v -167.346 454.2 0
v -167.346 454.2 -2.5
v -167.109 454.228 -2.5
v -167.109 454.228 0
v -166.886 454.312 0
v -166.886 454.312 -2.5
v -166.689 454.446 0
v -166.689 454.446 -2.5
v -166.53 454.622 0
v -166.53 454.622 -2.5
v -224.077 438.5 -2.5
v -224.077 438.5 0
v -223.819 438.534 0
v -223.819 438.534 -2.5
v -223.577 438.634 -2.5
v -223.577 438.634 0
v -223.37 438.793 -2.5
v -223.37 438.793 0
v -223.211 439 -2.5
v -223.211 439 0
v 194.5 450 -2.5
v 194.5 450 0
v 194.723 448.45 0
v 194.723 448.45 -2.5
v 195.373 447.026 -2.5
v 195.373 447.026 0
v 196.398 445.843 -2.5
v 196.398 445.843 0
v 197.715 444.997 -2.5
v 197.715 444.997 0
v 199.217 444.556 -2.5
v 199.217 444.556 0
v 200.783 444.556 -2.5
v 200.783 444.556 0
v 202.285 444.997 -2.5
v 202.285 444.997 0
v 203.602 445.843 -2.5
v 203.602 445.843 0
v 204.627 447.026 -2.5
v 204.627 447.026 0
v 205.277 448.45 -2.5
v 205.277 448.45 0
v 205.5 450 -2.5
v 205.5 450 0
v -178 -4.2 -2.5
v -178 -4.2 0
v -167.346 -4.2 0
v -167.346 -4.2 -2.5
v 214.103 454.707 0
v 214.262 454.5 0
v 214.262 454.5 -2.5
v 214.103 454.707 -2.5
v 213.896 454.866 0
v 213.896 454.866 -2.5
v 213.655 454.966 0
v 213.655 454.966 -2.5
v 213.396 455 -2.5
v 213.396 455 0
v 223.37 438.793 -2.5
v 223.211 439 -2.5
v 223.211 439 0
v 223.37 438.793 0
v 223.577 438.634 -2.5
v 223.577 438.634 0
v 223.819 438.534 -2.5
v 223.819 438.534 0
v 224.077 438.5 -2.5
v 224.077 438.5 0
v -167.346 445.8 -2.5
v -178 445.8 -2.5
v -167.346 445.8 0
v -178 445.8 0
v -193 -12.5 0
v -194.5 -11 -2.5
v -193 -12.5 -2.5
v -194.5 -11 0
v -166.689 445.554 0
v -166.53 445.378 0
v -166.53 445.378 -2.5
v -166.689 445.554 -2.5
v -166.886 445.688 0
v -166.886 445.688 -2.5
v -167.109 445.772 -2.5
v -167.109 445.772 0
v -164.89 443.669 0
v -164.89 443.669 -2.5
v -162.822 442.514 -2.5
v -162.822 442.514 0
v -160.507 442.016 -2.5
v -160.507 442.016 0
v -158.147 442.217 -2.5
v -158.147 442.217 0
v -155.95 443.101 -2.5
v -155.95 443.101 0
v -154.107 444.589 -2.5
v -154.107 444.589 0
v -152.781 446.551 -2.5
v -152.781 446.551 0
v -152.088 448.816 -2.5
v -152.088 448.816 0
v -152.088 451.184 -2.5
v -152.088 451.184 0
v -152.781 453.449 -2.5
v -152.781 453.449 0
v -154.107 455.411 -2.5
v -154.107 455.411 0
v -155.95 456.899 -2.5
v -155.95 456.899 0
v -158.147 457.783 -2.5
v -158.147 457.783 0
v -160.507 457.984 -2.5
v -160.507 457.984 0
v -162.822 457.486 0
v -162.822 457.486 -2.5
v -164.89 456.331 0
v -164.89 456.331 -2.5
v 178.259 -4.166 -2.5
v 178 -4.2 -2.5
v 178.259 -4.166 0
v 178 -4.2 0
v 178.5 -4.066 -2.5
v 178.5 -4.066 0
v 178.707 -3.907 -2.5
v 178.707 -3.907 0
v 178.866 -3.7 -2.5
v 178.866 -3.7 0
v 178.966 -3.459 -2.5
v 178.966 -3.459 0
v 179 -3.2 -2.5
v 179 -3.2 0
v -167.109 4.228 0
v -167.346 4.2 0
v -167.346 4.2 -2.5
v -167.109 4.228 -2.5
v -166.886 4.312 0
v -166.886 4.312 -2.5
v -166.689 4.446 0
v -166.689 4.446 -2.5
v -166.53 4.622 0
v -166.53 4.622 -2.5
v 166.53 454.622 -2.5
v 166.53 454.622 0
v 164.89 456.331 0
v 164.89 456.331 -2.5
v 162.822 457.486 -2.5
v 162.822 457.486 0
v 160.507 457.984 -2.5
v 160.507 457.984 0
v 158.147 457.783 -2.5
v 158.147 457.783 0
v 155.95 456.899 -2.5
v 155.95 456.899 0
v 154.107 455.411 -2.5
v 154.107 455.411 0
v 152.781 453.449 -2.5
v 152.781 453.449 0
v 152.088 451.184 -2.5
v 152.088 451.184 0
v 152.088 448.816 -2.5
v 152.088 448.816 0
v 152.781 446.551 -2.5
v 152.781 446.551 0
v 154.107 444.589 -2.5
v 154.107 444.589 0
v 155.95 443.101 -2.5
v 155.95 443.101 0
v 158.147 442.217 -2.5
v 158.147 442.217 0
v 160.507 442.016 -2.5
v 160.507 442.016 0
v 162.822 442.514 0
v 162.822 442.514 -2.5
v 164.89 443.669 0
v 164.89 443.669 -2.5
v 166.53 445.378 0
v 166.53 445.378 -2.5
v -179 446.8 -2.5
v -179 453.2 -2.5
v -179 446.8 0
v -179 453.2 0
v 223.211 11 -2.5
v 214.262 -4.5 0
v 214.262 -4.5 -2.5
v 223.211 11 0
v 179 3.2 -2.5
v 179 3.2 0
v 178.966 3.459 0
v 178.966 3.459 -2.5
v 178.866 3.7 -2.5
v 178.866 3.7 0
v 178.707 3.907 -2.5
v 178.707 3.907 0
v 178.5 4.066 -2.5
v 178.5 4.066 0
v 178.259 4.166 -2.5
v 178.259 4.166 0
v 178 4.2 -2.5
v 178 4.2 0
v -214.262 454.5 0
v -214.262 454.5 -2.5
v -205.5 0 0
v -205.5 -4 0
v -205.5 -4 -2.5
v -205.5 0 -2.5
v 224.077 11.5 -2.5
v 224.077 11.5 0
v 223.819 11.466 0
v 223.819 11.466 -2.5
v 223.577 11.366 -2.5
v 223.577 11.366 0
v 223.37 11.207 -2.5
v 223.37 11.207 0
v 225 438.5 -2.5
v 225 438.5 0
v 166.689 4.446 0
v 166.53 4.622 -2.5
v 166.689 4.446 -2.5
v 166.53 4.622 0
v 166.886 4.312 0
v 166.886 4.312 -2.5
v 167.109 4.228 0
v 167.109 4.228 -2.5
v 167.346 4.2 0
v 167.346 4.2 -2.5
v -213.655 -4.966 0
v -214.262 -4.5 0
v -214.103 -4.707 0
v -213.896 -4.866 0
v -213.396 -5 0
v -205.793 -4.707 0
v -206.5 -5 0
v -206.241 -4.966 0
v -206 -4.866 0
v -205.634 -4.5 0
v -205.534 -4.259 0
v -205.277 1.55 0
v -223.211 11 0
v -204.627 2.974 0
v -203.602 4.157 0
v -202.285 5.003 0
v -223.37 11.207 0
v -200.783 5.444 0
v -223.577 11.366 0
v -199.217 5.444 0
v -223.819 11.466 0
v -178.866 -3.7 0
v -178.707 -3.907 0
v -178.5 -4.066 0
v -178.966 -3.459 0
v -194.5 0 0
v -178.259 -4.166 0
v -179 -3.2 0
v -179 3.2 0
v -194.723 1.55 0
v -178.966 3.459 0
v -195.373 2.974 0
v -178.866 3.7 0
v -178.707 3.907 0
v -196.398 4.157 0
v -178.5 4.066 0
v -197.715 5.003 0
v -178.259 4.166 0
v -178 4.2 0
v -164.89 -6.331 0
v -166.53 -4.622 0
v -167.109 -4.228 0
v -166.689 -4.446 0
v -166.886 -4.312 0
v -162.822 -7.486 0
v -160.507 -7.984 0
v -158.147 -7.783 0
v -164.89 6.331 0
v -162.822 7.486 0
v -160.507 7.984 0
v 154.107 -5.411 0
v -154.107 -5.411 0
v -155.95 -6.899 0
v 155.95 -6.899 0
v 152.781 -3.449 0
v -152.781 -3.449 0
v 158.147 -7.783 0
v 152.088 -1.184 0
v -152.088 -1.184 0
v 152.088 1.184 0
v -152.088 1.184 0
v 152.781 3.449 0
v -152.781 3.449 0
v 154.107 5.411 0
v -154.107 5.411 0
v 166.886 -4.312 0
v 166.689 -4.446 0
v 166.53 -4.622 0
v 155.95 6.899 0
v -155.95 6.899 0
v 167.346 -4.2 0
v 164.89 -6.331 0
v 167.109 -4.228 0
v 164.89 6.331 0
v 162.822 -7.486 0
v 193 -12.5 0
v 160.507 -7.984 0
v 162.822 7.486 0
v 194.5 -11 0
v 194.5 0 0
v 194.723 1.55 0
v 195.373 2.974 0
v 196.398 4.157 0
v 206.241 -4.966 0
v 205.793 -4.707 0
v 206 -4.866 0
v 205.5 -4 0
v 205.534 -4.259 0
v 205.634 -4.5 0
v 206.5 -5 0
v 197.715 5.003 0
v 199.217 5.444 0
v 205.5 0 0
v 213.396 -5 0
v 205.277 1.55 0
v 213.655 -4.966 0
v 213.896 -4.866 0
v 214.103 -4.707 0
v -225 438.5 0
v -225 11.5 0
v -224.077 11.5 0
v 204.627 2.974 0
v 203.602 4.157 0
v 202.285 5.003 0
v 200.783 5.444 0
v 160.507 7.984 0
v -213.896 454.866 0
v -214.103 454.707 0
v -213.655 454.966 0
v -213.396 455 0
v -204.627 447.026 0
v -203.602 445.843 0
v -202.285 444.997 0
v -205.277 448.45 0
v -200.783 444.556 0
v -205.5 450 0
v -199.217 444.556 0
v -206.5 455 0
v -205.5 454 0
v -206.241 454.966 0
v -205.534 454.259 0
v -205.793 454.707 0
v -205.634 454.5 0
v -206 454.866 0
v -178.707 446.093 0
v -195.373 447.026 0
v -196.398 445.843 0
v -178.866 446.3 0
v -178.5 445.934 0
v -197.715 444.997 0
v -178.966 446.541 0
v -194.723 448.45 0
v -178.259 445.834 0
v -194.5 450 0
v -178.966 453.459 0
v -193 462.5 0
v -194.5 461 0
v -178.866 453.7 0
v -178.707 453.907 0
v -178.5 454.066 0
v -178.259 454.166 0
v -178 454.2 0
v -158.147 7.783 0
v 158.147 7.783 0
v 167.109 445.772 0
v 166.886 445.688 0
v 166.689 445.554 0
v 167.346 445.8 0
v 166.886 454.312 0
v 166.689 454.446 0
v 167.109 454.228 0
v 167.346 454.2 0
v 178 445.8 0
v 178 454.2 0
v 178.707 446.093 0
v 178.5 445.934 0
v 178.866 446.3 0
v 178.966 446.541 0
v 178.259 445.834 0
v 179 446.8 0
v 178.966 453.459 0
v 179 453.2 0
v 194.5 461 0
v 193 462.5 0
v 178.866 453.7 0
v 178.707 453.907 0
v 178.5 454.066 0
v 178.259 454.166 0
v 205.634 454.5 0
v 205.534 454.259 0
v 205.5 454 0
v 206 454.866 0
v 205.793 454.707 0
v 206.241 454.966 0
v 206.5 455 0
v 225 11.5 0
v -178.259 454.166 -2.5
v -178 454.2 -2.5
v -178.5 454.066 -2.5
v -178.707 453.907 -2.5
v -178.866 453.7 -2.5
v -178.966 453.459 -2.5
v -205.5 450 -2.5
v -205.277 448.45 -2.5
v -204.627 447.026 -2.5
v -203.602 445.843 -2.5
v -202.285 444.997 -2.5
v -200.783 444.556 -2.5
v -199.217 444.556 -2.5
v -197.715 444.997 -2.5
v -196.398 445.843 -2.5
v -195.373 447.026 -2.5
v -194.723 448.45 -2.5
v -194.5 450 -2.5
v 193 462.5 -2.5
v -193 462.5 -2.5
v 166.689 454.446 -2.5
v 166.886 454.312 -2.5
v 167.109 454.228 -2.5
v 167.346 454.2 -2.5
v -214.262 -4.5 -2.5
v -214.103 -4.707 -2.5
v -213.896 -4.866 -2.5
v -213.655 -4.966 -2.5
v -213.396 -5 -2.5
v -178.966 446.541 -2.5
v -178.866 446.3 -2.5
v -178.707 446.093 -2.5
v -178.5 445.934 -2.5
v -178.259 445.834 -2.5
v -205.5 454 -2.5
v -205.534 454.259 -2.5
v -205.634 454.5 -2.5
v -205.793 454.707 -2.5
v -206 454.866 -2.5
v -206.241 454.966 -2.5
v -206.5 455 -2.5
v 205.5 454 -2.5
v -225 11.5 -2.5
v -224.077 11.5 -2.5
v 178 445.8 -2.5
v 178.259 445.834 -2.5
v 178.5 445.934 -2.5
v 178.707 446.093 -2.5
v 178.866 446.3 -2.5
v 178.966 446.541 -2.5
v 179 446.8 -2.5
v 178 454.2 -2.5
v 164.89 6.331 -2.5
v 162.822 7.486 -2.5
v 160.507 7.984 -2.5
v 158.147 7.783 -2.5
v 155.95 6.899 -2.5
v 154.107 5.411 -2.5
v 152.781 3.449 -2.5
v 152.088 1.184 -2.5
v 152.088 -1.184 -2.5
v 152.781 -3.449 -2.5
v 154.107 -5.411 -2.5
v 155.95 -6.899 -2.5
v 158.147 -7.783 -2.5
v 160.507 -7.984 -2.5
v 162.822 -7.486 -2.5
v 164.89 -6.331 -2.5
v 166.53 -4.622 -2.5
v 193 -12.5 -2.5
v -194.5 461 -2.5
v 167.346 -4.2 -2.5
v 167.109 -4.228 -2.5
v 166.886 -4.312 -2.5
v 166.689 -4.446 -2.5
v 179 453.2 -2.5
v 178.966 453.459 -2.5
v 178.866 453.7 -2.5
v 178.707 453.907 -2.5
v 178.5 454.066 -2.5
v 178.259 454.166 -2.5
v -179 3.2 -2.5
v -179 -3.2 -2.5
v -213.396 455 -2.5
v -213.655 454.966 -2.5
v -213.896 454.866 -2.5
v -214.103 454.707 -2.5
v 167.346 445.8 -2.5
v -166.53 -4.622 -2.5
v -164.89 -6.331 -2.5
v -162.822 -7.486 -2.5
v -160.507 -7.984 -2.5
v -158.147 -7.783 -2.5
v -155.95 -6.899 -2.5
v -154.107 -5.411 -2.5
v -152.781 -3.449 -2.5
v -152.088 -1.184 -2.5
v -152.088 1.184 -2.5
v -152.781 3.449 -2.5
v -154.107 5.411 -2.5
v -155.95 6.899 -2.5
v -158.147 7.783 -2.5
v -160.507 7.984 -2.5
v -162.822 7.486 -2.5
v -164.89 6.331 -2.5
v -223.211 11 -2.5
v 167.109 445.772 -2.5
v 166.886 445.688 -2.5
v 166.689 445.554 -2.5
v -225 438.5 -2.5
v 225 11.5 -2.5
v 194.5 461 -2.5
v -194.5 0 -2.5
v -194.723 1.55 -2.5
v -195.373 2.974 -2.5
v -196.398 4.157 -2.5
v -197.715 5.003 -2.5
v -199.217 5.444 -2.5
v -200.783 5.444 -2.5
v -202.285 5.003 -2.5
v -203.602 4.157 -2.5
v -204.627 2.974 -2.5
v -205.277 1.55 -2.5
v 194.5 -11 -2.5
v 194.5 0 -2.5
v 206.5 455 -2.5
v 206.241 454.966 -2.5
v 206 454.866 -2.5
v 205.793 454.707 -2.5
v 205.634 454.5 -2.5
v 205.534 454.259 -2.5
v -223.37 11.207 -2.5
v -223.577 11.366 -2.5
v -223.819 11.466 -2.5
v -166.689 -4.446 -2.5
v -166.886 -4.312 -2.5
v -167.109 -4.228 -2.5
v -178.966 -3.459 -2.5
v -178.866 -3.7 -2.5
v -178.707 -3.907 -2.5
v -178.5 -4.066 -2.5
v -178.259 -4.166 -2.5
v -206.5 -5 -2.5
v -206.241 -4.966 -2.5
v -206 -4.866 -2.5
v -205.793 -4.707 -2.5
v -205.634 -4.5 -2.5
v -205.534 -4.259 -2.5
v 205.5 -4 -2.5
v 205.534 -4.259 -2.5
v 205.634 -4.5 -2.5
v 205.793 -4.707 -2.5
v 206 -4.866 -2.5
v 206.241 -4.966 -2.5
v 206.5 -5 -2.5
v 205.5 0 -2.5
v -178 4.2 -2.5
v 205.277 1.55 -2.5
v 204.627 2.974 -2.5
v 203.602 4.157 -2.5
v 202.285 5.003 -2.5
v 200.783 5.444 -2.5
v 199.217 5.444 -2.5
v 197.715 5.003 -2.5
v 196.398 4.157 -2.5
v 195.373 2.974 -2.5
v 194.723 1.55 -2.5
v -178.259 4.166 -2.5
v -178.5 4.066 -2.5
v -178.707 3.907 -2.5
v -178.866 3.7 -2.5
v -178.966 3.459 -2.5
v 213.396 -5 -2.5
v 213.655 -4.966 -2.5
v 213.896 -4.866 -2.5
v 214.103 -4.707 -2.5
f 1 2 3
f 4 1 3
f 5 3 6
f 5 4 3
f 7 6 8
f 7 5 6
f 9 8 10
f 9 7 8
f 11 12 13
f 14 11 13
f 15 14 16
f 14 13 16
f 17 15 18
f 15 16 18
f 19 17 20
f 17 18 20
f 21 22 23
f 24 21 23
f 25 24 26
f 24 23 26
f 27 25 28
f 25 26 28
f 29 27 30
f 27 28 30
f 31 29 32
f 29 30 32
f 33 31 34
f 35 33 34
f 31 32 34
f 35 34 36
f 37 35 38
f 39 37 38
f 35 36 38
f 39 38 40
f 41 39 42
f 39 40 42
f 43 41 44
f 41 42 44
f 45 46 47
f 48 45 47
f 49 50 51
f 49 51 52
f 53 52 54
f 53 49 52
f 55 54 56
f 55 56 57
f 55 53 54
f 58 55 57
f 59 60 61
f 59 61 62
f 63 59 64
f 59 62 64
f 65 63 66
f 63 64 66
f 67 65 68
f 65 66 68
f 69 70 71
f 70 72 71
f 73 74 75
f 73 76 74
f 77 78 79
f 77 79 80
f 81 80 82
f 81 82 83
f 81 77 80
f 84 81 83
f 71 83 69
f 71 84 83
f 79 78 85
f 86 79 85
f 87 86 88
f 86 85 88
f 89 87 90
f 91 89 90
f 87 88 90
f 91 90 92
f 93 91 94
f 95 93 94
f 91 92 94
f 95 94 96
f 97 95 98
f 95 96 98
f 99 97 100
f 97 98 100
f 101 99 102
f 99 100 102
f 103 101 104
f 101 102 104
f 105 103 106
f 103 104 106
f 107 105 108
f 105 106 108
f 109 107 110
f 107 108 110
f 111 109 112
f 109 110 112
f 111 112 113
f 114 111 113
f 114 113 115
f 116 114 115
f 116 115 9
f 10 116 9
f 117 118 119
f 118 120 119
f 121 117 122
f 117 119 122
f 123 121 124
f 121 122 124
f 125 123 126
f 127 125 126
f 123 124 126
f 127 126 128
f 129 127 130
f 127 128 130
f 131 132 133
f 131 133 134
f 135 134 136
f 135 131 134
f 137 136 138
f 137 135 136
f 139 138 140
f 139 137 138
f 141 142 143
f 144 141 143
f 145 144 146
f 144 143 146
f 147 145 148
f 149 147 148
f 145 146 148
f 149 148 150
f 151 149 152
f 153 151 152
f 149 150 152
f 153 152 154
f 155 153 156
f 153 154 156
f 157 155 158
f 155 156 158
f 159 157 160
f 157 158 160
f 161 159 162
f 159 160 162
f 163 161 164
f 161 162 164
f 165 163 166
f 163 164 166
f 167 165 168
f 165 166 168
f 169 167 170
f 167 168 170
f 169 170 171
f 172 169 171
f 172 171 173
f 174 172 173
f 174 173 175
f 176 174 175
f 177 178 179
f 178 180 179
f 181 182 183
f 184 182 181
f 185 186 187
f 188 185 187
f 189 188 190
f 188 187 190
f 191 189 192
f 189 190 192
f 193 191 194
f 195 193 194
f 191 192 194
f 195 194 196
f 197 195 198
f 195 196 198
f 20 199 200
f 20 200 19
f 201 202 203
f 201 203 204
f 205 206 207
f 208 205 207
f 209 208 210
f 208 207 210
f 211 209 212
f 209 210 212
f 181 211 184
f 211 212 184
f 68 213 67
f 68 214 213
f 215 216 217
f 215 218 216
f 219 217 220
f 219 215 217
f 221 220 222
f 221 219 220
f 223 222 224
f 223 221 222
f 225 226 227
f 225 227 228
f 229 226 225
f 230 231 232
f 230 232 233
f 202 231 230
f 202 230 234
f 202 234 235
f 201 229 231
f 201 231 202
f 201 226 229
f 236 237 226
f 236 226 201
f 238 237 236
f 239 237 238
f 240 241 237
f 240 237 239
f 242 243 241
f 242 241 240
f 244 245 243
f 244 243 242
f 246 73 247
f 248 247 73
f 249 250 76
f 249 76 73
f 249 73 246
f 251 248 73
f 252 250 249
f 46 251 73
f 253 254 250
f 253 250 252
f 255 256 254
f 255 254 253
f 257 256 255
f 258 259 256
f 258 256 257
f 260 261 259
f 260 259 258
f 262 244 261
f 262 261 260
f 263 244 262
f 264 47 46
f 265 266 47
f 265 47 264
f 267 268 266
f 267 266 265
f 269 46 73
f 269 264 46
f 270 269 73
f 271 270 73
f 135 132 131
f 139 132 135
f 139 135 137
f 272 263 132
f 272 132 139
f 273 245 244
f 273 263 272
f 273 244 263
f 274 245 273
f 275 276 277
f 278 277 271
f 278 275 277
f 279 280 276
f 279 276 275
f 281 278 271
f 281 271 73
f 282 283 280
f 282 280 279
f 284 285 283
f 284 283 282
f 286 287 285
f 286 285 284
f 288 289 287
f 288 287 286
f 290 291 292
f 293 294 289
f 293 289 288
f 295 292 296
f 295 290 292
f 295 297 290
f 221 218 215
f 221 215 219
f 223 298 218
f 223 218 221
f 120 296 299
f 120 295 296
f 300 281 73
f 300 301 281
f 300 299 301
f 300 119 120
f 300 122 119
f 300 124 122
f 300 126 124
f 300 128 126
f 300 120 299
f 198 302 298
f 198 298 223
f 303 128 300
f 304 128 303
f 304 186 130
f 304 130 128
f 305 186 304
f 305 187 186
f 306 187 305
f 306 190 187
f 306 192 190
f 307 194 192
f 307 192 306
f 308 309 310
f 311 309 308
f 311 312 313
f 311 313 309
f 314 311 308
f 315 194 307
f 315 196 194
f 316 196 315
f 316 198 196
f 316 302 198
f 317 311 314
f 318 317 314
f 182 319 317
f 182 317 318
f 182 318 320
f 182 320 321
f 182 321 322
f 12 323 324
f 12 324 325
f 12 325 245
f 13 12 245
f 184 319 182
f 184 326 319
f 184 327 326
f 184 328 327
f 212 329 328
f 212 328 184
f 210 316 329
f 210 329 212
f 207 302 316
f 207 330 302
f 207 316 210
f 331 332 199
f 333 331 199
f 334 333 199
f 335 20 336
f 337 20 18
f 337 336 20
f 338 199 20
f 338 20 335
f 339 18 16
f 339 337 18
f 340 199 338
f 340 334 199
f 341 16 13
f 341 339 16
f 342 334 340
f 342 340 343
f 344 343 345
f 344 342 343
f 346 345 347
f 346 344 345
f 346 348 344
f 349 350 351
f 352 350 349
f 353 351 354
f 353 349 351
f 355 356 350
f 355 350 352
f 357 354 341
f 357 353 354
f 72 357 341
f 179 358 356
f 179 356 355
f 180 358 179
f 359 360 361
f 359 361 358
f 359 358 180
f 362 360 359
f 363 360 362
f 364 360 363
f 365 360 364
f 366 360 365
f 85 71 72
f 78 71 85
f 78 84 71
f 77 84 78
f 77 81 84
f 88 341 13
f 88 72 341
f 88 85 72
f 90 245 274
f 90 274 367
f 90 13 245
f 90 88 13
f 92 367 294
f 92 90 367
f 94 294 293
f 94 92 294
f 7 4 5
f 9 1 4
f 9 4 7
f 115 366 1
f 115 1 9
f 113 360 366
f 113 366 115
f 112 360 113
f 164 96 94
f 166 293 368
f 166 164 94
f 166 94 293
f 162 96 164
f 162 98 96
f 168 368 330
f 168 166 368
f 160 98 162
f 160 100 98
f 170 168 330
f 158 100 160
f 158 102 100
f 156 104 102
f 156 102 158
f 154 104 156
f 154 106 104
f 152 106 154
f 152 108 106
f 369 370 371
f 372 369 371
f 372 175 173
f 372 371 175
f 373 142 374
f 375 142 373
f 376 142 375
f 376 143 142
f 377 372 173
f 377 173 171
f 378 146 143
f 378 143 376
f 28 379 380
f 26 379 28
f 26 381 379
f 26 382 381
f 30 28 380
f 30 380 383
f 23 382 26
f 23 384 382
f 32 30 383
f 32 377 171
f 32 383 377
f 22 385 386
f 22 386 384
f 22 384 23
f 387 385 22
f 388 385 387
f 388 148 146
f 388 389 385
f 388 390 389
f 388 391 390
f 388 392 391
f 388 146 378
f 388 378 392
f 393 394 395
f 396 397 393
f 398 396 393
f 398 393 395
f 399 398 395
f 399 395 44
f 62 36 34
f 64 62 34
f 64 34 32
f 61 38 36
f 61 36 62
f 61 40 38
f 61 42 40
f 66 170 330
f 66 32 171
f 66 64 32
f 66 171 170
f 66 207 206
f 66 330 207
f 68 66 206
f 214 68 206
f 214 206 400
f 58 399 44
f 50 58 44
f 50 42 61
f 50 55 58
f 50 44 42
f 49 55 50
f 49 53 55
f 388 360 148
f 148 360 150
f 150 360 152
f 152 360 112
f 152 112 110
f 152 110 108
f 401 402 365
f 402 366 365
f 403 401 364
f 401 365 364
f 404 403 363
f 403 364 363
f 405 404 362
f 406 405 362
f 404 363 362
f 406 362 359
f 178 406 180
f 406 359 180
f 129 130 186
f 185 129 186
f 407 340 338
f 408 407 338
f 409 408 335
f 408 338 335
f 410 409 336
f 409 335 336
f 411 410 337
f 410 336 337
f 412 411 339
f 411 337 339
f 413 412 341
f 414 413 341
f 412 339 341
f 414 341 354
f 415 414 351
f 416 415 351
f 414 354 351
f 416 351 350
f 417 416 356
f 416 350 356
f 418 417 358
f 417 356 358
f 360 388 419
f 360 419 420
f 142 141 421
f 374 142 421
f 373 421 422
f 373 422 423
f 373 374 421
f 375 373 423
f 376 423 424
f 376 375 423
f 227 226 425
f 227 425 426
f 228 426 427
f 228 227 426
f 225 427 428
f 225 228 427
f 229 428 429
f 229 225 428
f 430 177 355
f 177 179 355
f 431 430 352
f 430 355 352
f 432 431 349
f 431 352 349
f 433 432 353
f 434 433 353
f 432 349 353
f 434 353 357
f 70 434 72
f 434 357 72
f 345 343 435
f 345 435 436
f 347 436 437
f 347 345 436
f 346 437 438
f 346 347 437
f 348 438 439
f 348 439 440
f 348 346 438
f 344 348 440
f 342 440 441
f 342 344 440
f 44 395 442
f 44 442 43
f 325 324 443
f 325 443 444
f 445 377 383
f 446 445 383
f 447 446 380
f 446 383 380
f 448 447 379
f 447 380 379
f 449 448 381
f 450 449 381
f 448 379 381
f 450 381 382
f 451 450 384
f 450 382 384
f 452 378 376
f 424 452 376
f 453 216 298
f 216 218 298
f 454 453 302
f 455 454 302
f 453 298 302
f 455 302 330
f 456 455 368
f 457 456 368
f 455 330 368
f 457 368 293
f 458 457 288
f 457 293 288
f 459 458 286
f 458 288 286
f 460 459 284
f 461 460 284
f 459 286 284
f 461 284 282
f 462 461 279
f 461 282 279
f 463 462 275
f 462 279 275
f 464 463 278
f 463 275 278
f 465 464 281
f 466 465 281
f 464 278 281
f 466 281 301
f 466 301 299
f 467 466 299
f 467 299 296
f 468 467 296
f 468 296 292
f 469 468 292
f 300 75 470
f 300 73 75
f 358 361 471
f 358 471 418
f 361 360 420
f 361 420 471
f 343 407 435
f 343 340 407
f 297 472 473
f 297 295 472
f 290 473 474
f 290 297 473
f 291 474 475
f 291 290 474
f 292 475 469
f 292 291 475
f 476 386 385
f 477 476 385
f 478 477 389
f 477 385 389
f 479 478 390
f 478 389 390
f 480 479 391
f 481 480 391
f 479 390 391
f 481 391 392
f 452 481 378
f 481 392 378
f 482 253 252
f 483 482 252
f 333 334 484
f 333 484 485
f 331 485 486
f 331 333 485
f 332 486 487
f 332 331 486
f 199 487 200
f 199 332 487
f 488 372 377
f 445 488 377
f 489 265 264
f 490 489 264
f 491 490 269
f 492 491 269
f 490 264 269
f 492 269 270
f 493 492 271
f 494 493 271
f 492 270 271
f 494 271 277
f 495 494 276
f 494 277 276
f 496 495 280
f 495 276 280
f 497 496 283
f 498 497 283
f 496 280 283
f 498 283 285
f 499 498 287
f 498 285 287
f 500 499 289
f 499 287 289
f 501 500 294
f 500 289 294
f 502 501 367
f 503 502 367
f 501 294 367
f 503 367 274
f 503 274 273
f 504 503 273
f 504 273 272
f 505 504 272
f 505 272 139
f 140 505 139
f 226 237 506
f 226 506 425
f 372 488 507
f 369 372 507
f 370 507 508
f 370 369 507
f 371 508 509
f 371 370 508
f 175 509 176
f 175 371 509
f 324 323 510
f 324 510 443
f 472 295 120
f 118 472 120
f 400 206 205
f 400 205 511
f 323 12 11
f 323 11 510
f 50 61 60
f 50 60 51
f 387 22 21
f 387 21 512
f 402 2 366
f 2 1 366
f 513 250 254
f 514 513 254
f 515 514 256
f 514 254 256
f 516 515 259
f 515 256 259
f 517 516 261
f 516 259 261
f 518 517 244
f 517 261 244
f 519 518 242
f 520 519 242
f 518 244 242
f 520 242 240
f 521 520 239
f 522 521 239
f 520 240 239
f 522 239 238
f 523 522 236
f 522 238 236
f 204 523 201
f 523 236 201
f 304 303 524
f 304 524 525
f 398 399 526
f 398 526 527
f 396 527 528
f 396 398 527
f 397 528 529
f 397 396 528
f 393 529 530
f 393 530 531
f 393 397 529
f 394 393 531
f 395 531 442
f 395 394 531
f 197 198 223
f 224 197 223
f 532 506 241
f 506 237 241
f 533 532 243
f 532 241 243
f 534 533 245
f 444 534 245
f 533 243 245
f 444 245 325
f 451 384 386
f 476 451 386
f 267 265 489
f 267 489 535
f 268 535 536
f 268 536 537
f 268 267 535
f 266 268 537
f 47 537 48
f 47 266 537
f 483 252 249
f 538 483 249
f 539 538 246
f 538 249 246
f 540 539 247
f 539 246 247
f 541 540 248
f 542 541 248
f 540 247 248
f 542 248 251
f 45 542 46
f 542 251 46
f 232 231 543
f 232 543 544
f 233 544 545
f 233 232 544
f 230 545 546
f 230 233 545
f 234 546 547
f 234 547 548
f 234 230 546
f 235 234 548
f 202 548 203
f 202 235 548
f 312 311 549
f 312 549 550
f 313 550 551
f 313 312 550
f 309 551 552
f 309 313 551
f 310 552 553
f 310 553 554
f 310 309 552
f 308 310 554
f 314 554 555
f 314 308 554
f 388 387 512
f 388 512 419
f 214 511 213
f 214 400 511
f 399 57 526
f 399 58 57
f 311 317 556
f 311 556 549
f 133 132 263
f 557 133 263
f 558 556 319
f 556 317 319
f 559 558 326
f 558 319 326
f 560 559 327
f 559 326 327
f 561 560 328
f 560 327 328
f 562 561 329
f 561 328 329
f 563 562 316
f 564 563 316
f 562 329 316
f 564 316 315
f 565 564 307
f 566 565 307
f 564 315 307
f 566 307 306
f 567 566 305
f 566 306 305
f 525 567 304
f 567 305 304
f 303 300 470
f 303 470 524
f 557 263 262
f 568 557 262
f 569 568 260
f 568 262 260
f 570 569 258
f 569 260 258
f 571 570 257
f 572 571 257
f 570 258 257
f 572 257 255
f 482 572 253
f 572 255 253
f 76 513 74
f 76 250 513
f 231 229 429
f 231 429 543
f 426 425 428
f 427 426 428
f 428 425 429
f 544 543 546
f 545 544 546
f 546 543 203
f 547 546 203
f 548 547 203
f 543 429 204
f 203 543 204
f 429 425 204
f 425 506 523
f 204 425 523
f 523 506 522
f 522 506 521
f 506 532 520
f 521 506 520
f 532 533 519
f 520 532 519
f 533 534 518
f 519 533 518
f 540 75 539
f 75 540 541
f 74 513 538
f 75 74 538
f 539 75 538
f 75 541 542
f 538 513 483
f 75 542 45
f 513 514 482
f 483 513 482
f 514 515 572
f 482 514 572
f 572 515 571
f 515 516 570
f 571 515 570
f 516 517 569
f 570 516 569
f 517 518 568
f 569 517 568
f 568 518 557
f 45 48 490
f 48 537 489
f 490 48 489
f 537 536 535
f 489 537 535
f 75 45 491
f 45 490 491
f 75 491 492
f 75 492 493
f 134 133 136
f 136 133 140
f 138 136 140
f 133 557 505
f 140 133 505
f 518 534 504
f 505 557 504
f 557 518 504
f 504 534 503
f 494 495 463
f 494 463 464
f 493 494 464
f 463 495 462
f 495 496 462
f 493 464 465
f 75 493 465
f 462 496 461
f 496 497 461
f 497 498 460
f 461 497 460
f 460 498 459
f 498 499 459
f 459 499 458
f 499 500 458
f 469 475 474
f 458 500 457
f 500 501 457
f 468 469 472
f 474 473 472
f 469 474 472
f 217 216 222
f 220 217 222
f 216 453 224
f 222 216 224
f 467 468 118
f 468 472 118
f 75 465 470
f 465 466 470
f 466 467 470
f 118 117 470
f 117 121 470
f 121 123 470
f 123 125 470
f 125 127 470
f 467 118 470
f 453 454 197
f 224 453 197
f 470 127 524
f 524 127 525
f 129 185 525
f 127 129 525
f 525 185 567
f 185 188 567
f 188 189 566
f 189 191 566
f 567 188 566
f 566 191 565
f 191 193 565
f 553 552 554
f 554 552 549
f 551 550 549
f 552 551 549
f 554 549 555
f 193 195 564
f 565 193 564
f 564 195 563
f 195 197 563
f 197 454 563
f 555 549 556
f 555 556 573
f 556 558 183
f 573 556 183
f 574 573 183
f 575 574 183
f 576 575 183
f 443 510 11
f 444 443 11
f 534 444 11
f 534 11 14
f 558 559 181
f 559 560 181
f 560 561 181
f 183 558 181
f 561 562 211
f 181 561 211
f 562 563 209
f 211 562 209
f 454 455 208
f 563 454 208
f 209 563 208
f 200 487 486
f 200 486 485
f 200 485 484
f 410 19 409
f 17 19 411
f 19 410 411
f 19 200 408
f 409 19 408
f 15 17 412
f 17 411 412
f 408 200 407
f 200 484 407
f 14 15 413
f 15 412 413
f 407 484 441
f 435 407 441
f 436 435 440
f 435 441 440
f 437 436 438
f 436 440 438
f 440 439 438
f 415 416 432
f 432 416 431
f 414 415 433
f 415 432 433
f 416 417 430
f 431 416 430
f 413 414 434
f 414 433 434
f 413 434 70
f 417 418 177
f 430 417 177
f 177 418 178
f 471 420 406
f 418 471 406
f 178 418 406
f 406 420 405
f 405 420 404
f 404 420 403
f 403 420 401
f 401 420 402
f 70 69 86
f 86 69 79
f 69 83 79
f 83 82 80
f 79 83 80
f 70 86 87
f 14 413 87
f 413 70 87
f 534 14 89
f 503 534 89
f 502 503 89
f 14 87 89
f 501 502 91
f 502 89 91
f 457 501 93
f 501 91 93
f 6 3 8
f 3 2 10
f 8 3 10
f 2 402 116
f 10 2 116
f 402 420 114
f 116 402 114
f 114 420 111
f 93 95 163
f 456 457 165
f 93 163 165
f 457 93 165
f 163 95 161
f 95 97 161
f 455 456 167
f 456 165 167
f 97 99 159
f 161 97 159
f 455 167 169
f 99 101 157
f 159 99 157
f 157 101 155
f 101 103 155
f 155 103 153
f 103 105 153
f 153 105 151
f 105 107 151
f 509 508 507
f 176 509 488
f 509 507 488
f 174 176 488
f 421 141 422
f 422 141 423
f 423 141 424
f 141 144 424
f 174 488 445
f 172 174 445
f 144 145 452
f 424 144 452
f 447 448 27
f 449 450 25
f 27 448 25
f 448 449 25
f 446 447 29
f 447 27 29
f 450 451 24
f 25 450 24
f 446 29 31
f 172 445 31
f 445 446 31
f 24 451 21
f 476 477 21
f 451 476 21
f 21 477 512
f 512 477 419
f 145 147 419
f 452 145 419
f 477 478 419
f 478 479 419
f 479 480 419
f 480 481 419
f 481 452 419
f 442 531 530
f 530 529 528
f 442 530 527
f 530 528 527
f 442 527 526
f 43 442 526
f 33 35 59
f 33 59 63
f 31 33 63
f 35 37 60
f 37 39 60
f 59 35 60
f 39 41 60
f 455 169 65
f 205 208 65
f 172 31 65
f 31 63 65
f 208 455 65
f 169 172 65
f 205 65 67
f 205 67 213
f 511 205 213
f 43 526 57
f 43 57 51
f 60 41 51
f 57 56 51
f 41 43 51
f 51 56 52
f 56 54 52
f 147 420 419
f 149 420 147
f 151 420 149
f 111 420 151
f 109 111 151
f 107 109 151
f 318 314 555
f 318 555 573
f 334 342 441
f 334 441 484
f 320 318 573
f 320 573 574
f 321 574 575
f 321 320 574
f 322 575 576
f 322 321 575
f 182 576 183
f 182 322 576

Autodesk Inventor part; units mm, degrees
sketch "Sketch_11" plane through (0, 0, 0) normal (0, 0, 1) x (1, 0, 0)
  line L0 (-225, 438.5) -> (-225, 11.5)
  line L1 (-225, 11.5) -> (-224.0774, 11.5)
  arc A0 (-223.2113, 11) -> (-224.0774, 11.5) centre (-224.0774, 10.5) ccw
  line L2 (-223.2113, 11) -> (-214.2624, -4.5)
  arc A1 (-214.2624, -4.5) -> (-213.3964, -5) centre (-213.3964, -4) ccw
  line L3 (-213.3964, -5) -> (-206.5, -5)
  arc A2 (-206.5, -5) -> (-205.5, -4) centre (-206.5, -4) ccw
  line L4 (-205.5, -4) -> (-205.5, 0)
  arc A3 (-194.5, 0) -> (-205.5, 0) centre (-200, 0) ccw
  line L5 (-194.5, 0) -> (-194.5, -11)
  line L6 (-194.5, -11) -> (-193, -12.5)
  line L7 (-193, -12.5) -> (193, -12.5)
  line L8 (193, -12.5) -> (194.5, -11)
  line L9 (194.5, -11) -> (194.5, 0)
  arc A4 (205.5, 0) -> (194.5, 0) centre (200, 0) ccw
  line L10 (205.5, 0) -> (205.5, -4)
  arc A5 (205.5, -4) -> (206.5, -5) centre (206.5, -4) ccw
  line L11 (206.5, -5) -> (213.3964, -5)
  arc A6 (213.3964, -5) -> (214.2624, -4.5) centre (213.3964, -4) ccw
  line L12 (214.2624, -4.5) -> (223.2113, 11)
  arc A7 (224.0774, 11.5) -> (223.2113, 11) centre (224.0774, 10.5) ccw
  line L13 (224.0774, 11.5) -> (225, 11.5)
  line L14 (225, 11.5) -> (225, 438.5)
  line L15 (225, 438.5) -> (224.0774, 438.5)
  arc A8 (223.2113, 439) -> (224.0774, 438.5) centre (224.0774, 439.5) ccw
  line L16 (223.2113, 439) -> (214.2624, 454.5)
  arc A9 (214.2624, 454.5) -> (213.3964, 455) centre (213.3964, 454) ccw
  line L17 (213.3964, 455) -> (206.5, 455)
  arc A10 (206.5, 455) -> (205.5, 454) centre (206.5, 454) ccw
  line L18 (205.5, 454) -> (205.5, 450)
  arc A11 (194.5, 450) -> (205.5, 450) centre (200, 450) ccw
  line L19 (194.5, 450) -> (194.5, 461)
  line L20 (194.5, 461) -> (193, 462.5)
  line L21 (193, 462.5) -> (-193, 462.5)
  line L22 (-193, 462.5) -> (-194.5, 461)
  line L23 (-194.5, 461) -> (-194.5, 450)
  arc A12 (-205.5, 450) -> (-194.5, 450) centre (-200, 450) ccw
  line L24 (-205.5, 450) -> (-205.5, 454)
  arc A13 (-205.5, 454) -> (-206.5, 455) centre (-206.5, 454) ccw
  line L25 (-206.5, 455) -> (-213.3964, 455)
  arc A14 (-213.3964, 455) -> (-214.2624, 454.5) centre (-213.3964, 454) ccw
  line L26 (-214.2624, 454.5) -> (-223.2113, 439)
  arc A15 (-224.0774, 438.5) -> (-223.2113, 439) centre (-224.0774, 439.5) ccw
  line L27 (-224.0774, 438.5) -> (-225, 438.5)
  arc A16 (166.5296, 4.6222) -> (166.5296, -4.6222) centre (160, 0) ccw
  arc A17 (167.3457, -4.2) -> (166.5296, -4.6222) centre (167.3457, -5.2) ccw
  line L28 (167.3457, -4.2) -> (178, -4.2)
  arc A18 (178, -4.2) -> (179, -3.2) centre (178, -3.2) ccw
  line L29 (179, -3.2) -> (179, 3.2)
  arc A19 (179, 3.2) -> (178, 4.2) centre (178, 3.2) ccw
  line L30 (178, 4.2) -> (167.3457, 4.2)
  arc A20 (166.5296, 4.6222) -> (167.3457, 4.2) centre (167.3457, 5.2) ccw
  arc A21 (166.5296, 454.6222) -> (166.5296, 445.3778) centre (160, 450) ccw
  arc A22 (167.3457, 445.8) -> (166.5296, 445.3778) centre (167.3457, 444.8) ccw
  line L31 (167.3457, 445.8) -> (178, 445.8)
  arc A23 (178, 445.8) -> (179, 446.8) centre (178, 446.8) ccw
  line L32 (179, 446.8) -> (179, 453.2)
  arc A24 (179, 453.2) -> (178, 454.2) centre (178, 453.2) ccw
  line L33 (178, 454.2) -> (167.3457, 454.2)
  arc A25 (166.5296, 454.6222) -> (167.3457, 454.2) centre (167.3457, 455.2) ccw
  line L34 (-179, 3.2) -> (-179, -3.2)
  arc A26 (-179, -3.2) -> (-178, -4.2) centre (-178, -3.2) ccw
  line L35 (-178, -4.2) -> (-167.3457, -4.2)
  arc A27 (-166.5296, -4.6222) -> (-167.3457, -4.2) centre (-167.3457, -5.2) ccw
  arc A28 (-166.5296, -4.6222) -> (-166.5296, 4.6222) centre (-160, 0) ccw
  arc A29 (-167.3457, 4.2) -> (-166.5296, 4.6222) centre (-167.3457, 5.2) ccw
  line L36 (-167.3457, 4.2) -> (-178, 4.2)
  arc A30 (-178, 4.2) -> (-179, 3.2) centre (-178, 3.2) ccw
  arc A31 (-179, 446.8) -> (-178, 445.8) centre (-178, 446.8) ccw
  line L37 (-178, 445.8) -> (-167.3457, 445.8)
  arc A32 (-166.5296, 445.3778) -> (-167.3457, 445.8) centre (-167.3457, 444.8) ccw
  arc A33 (-166.5296, 445.3778) -> (-166.5296, 454.6222) centre (-160, 450) ccw
  arc A34 (-167.3457, 454.2) -> (-166.5296, 454.6222) centre (-167.3457, 455.2) ccw
  line L38 (-167.3457, 454.2) -> (-178, 454.2)
  arc A35 (-178, 454.2) -> (-179, 453.2) centre (-178, 453.2) ccw
  line L39 (-179, 453.2) -> (-179, 446.8)
extrude "Extrusion1" add sketch "Sketch_11" against normal blind 2.5
ref_plane "MP_XY" through (0, 0, 0) normal (0, 0, 1) x (1, 0, 0)
ref_plane "MP_YZ" through (0, 0, 0) normal (1, 0, 0) x (0, 1, 0)
ref_plane "MP_ZX" through (0, 0, 0) normal (0, 1, 0) x (0, 0, 1)
ref_plane "to_EB_XY" through (174.8, 0, -2.5) normal (0, 0, 1) x (1, 0, 0)
ref_plane "to_EB_YZ" through (174.8, 0, -2.5) normal (1, 0, 0) x (0, 1, 0)
ref_plane "to_EB_ZX" through (174.8, 0, -2.5) normal (0, 1, 0) x (0, 0, 1)
properties part number "155X_02_00_P6_(1)"
